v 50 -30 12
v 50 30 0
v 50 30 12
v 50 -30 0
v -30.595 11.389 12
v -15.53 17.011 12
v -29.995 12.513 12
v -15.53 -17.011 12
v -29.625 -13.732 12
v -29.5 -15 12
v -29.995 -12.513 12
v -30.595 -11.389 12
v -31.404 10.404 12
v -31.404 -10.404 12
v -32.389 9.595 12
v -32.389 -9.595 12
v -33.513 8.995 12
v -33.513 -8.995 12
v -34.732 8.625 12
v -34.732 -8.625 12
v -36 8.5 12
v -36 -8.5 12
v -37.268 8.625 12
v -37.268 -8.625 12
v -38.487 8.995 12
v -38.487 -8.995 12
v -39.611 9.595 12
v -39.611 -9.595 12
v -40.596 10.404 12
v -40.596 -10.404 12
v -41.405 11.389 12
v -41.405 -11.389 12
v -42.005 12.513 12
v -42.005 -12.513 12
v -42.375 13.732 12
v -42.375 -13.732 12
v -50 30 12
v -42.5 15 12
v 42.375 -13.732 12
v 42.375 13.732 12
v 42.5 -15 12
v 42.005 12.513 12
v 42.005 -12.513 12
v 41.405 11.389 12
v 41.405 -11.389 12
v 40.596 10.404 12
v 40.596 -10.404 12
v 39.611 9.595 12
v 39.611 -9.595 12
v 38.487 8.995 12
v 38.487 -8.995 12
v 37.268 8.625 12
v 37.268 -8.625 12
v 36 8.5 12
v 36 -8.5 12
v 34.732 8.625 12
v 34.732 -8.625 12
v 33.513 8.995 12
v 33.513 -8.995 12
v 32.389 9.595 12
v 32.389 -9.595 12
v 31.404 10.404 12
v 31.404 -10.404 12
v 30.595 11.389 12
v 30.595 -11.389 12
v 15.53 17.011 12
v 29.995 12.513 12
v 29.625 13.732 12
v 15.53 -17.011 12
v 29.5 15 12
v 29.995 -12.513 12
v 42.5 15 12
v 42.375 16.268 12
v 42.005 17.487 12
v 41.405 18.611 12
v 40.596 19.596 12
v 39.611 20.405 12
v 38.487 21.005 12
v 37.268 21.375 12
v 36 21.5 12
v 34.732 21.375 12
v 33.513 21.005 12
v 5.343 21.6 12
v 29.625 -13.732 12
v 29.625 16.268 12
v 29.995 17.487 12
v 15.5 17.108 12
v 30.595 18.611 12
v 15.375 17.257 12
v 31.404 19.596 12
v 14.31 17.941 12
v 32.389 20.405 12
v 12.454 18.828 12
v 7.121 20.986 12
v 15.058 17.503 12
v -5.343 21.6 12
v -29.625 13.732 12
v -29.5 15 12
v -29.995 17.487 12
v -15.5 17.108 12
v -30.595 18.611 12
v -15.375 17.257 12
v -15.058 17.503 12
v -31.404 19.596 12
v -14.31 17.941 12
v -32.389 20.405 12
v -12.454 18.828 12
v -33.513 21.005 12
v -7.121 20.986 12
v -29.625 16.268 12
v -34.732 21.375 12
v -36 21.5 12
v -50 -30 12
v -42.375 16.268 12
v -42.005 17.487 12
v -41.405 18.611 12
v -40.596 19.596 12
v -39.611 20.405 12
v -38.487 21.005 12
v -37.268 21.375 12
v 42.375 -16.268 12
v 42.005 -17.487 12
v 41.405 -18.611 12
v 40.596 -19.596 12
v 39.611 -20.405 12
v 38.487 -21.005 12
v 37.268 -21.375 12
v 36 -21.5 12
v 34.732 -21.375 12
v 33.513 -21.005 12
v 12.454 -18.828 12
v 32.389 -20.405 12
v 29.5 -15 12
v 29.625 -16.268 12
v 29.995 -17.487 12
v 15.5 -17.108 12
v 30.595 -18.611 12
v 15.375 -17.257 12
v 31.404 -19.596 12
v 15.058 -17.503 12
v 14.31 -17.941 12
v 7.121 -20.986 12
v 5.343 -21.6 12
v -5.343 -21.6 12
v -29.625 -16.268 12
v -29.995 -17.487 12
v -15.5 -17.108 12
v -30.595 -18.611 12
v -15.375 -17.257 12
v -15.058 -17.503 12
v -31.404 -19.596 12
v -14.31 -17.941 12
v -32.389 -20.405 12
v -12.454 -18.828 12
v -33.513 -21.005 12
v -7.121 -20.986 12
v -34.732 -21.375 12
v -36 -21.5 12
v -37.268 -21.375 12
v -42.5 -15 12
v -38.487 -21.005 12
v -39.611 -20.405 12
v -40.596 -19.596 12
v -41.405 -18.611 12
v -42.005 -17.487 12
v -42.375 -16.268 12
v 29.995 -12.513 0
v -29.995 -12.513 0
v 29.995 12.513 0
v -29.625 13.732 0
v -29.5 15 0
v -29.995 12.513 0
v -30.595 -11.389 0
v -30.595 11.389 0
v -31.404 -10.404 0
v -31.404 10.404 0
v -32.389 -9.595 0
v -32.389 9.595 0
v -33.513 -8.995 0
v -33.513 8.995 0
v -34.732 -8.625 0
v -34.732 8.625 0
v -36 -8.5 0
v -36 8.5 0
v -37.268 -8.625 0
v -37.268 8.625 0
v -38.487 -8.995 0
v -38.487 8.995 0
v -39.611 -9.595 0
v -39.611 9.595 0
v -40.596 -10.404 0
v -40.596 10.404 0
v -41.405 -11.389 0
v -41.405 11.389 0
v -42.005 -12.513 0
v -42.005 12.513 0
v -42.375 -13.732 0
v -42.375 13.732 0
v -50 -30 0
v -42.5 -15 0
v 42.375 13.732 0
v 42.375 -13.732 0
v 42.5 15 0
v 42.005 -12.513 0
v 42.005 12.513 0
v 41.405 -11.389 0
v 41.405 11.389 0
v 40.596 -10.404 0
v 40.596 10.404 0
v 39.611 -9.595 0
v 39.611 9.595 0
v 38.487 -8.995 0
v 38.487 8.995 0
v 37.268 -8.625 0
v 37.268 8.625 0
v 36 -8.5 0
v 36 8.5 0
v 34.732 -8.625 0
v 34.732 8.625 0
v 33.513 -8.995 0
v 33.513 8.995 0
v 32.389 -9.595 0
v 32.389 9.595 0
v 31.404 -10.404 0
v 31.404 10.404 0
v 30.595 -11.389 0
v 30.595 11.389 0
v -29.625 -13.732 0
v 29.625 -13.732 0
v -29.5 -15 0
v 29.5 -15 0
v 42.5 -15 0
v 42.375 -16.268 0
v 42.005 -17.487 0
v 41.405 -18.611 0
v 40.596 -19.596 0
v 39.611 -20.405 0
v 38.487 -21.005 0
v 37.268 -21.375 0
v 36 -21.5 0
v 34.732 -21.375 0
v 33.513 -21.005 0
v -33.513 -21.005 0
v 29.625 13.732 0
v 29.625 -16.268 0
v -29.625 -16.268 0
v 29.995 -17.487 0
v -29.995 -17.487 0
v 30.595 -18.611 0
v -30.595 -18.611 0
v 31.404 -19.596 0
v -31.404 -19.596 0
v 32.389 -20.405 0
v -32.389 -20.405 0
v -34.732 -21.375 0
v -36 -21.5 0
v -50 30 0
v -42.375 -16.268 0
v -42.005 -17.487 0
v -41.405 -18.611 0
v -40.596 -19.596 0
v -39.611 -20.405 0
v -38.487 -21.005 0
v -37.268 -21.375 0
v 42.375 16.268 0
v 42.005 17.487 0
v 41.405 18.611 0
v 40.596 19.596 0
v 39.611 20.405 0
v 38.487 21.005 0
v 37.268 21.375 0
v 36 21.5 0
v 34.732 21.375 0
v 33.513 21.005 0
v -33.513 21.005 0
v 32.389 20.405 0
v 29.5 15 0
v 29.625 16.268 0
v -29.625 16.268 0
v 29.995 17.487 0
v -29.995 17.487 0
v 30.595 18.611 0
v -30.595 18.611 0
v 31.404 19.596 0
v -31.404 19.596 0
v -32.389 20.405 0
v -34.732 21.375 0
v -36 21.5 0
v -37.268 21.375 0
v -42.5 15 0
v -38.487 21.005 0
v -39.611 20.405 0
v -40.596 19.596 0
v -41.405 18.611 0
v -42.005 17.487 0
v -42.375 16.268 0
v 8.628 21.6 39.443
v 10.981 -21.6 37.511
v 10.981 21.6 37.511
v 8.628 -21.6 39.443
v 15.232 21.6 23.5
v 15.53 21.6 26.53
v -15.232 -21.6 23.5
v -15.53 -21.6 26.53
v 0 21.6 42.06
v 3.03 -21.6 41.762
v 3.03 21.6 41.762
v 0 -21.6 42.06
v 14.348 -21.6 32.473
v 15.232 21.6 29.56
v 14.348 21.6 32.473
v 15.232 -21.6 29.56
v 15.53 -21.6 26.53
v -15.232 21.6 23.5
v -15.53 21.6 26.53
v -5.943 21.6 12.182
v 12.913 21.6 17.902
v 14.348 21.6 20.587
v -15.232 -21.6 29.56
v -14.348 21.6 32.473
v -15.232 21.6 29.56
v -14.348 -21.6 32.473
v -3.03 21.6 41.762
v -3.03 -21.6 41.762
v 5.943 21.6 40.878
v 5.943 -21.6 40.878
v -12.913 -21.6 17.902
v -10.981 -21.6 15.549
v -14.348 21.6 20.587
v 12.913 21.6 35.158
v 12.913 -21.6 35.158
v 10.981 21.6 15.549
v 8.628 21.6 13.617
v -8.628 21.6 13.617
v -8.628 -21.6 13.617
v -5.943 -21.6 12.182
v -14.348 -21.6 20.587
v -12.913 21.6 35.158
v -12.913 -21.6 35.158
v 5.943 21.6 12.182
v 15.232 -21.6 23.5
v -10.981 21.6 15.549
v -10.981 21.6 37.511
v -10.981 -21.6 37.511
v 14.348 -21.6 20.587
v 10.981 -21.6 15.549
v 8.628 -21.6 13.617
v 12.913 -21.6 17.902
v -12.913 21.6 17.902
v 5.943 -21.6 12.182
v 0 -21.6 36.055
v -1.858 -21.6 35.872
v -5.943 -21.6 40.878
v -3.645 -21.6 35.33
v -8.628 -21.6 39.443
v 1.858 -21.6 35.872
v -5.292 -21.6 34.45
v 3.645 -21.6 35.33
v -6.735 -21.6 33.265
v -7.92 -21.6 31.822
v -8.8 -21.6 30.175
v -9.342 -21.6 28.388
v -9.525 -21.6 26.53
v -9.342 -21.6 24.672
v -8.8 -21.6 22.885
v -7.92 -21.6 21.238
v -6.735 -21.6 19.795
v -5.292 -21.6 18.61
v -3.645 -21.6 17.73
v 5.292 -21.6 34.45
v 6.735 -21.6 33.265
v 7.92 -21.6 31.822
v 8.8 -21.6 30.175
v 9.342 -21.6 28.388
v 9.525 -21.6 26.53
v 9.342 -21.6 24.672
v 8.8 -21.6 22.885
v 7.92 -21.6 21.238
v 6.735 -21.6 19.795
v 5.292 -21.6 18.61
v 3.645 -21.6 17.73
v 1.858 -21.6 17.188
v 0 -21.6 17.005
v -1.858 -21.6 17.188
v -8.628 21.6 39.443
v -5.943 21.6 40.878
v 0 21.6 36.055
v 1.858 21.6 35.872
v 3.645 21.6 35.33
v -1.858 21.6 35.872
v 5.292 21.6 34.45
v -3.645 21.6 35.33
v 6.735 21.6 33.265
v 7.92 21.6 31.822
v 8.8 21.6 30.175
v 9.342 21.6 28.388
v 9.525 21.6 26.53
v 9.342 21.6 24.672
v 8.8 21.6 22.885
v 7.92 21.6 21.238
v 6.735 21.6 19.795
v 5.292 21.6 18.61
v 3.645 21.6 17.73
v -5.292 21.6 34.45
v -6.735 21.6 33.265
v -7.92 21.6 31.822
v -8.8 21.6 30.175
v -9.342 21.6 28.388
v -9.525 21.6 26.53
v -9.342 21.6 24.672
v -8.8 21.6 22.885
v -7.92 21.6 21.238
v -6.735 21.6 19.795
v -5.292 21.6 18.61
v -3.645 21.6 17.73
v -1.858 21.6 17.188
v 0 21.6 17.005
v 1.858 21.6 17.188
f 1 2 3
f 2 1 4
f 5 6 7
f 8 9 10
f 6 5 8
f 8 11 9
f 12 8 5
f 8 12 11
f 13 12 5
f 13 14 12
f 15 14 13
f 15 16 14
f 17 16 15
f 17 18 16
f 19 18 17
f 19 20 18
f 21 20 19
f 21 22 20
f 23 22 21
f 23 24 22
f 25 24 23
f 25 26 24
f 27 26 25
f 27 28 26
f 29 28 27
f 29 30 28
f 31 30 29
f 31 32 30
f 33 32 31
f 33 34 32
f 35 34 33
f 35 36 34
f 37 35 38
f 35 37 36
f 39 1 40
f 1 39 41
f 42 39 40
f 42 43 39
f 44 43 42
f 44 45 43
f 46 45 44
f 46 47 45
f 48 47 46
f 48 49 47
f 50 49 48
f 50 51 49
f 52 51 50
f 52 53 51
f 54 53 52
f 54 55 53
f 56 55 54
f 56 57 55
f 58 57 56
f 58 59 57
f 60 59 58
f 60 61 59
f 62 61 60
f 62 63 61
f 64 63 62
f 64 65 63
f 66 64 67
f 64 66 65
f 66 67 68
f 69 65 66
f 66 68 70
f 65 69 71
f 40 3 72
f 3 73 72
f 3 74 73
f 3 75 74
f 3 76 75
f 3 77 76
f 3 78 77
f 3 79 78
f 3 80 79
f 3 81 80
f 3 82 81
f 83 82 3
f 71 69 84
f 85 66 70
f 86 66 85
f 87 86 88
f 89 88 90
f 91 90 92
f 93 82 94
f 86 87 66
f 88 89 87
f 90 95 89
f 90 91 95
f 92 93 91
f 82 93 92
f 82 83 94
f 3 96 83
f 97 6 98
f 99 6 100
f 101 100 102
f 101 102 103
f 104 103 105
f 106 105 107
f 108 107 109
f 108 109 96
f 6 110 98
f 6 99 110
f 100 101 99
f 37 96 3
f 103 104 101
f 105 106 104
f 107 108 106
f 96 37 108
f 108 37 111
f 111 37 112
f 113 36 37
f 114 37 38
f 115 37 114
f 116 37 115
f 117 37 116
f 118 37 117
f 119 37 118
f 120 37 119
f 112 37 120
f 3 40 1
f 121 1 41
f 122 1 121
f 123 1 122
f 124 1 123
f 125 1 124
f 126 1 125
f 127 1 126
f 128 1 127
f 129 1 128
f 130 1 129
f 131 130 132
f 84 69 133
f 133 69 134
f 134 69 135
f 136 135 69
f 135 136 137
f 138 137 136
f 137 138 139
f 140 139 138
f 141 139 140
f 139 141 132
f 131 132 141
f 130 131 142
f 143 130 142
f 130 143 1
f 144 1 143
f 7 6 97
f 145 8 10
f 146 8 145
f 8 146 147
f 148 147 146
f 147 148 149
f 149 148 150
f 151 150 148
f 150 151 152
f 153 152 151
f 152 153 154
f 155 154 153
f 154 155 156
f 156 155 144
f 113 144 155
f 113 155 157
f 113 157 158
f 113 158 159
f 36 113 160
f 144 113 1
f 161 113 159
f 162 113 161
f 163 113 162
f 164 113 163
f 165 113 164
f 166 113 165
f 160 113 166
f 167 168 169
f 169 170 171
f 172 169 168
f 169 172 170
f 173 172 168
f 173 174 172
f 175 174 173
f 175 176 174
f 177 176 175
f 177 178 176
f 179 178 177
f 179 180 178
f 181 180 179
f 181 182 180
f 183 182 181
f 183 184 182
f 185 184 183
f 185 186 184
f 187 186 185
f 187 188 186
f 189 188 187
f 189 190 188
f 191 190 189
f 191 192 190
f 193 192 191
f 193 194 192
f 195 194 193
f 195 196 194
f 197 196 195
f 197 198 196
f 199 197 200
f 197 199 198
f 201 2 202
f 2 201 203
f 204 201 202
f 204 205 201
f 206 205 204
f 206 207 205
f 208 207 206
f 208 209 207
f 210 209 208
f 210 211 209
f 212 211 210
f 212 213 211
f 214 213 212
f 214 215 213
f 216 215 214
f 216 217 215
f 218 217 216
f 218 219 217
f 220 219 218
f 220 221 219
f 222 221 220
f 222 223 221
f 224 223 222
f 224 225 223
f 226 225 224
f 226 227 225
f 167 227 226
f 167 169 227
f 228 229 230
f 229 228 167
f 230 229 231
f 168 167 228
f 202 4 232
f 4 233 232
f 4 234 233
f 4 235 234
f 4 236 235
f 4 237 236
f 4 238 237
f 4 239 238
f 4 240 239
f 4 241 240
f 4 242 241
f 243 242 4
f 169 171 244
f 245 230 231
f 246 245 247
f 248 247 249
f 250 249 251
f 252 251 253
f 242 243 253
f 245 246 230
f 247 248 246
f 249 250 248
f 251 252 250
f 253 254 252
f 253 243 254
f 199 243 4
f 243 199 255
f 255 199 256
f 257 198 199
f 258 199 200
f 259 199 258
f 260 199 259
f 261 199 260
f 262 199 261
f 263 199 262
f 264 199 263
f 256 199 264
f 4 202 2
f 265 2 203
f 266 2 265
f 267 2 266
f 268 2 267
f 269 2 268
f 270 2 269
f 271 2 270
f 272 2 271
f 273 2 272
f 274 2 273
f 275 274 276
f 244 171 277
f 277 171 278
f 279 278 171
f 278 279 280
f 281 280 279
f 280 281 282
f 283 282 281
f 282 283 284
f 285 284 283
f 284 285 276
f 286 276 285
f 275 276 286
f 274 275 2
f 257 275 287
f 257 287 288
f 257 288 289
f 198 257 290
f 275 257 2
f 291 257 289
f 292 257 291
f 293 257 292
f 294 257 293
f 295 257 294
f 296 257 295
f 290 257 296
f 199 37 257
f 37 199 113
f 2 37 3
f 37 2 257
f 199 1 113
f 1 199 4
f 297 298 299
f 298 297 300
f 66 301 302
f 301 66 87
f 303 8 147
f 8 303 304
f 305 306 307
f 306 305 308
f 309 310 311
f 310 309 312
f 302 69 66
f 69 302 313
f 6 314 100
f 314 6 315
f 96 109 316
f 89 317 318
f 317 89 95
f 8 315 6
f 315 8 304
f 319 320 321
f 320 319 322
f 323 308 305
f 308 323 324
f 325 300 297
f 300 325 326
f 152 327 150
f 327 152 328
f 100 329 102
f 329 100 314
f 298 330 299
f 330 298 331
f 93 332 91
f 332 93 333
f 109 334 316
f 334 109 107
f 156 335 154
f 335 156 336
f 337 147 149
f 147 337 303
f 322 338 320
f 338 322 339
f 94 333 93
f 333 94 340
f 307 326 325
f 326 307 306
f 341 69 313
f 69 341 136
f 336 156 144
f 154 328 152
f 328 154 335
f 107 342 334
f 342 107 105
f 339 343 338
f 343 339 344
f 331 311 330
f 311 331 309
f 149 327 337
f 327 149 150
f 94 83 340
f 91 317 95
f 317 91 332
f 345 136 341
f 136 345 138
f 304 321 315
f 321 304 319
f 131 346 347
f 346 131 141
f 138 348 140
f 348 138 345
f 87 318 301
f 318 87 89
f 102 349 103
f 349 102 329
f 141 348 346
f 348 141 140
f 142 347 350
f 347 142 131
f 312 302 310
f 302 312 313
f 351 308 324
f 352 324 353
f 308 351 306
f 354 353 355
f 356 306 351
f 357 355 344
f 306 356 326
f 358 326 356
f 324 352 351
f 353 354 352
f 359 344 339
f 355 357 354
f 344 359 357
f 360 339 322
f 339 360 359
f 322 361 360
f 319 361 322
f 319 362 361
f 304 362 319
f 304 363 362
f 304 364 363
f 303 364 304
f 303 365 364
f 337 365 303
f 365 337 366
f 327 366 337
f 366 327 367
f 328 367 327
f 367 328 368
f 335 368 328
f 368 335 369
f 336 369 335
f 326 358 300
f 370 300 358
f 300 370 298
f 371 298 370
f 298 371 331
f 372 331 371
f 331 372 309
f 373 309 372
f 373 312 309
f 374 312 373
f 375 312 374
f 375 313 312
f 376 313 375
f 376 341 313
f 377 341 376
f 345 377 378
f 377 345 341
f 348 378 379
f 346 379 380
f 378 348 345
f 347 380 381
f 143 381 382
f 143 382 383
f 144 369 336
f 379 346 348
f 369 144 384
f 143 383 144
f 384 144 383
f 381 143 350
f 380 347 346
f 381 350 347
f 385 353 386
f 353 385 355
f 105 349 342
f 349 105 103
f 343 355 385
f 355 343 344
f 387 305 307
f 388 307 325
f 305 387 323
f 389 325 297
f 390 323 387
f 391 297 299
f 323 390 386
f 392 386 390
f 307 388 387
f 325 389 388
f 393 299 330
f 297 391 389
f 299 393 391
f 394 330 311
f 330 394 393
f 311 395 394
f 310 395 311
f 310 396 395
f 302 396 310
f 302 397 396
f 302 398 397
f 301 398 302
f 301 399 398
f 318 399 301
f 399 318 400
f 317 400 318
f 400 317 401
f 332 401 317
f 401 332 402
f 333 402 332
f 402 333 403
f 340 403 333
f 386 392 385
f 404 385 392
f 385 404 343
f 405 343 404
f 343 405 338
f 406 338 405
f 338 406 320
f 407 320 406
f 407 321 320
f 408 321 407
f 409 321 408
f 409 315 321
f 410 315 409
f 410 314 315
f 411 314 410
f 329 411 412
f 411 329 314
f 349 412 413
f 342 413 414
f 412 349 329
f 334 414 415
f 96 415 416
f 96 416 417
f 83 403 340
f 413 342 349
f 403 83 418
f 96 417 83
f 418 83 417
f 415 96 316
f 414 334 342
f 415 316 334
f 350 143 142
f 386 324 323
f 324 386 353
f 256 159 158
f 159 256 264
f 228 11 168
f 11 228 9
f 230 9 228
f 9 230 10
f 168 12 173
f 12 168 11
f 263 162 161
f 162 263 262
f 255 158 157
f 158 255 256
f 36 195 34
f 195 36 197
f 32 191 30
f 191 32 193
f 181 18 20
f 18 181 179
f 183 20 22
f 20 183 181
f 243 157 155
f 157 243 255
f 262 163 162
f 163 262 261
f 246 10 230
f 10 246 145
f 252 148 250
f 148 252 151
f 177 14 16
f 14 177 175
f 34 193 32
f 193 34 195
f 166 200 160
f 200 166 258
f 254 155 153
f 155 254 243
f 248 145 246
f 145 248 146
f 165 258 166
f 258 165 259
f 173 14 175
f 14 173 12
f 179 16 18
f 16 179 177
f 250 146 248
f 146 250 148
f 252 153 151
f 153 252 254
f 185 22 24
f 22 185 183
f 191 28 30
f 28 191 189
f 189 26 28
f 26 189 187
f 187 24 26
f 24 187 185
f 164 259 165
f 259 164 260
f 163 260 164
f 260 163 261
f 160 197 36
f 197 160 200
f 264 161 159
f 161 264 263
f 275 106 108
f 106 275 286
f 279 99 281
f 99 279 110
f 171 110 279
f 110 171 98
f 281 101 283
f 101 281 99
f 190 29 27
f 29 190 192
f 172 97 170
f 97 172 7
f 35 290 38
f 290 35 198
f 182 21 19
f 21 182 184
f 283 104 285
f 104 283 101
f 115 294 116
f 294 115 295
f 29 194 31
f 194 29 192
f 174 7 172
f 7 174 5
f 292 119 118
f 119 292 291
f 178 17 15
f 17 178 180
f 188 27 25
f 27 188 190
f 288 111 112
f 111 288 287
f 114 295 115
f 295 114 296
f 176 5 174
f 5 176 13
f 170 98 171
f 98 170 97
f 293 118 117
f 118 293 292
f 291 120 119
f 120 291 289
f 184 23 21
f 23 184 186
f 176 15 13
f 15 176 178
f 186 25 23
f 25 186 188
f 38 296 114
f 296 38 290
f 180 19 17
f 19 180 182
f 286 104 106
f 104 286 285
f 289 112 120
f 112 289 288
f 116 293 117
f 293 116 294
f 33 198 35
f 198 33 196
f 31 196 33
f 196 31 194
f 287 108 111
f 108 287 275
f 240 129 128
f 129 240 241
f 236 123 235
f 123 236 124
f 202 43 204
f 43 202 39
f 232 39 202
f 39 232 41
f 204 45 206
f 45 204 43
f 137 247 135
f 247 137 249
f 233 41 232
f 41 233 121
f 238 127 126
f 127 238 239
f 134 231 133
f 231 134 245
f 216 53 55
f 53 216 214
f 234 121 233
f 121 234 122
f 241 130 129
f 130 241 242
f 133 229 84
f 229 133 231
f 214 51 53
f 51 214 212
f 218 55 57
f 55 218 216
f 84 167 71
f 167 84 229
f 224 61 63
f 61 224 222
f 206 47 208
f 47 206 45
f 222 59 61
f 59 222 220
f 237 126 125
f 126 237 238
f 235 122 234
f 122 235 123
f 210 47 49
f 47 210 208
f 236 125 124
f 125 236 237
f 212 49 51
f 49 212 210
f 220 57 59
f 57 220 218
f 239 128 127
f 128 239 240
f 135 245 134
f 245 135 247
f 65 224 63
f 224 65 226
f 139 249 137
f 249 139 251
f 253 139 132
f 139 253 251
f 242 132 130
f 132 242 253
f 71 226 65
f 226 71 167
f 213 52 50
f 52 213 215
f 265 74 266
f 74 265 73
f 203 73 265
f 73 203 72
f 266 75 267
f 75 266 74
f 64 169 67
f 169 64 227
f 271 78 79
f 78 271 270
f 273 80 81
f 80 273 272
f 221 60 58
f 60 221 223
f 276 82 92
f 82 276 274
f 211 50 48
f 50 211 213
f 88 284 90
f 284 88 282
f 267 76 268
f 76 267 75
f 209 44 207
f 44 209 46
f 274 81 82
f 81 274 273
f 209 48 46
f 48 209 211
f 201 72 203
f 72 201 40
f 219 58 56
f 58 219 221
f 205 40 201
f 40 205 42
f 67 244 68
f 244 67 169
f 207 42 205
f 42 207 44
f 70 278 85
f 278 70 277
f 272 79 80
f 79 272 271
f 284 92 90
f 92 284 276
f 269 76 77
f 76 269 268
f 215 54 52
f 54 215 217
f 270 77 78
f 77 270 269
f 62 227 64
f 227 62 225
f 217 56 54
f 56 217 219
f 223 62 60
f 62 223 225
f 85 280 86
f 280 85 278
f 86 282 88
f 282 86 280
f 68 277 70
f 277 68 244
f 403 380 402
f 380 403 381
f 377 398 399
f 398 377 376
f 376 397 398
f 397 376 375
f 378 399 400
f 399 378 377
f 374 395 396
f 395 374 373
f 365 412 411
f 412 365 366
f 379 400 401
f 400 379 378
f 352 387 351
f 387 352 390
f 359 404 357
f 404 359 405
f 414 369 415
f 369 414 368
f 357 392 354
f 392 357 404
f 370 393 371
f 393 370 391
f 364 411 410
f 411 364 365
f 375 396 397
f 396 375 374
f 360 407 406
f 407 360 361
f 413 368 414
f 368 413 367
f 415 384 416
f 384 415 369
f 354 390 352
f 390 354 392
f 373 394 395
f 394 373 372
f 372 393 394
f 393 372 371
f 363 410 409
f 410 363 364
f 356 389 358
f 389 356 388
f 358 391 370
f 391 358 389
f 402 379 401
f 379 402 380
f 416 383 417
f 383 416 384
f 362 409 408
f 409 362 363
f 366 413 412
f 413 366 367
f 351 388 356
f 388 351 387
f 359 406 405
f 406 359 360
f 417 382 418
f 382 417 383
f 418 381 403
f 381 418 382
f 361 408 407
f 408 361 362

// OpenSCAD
$fn = 32;

// ----------------------------------------------------------------------
// Bearing block: 100 x 60 mm base, 19.05 mm bore at 26.53 mm
// ----------------------------------------------------------------------

// --- parameters (mm) ---
base_w = 100;             // base width
base_d = 60;              // base depth
base_t = 12;              // base thickness
bore_d = 19.05;           // shaft / bearing bore
house_r = 15.53;          // housing outer radius
house_len = 43.2;         // housing length along the shaft
foot_w = 31.06;           // foot width under the housing
foot_len = 33.2;          // foot length along the shaft
axis_z = 26.53;           // bore axis height above the base
holes_d = 13;             // mounting holes
hole_x = 36;              // mounting hole spacing

difference() {
  union() {
    /* base plate with its underside on z = 0 */
    translate([0, 0, base_t / 2]) cube([base_w, base_d, base_t], center = true);
    /* hull foot: a straight web blending into the round housing */
    hull() {
      translate([0, 0, base_t - 0.5]) cube([foot_w, foot_len, 1.6], center = true);
      translate([0, 0, axis_z]) rotate([-90, 0, 0]) cylinder(h = house_len, d = 2 * house_r, center = true);
    }
  }
  /* bore through the housing, 2.5 mm clear on both sides */
  translate([0, 0, axis_z]) rotate([-90, 0, 0]) cylinder(h = house_len + 5, d = bore_d, center = true);
  /* mounting holes through the base plate */
  for (hx = [-36, 36]) {
    for (hy = [-15, 15]) {
      translate([hx, hy, -2.5]) cylinder(h = base_t + 5, d = holes_d);
    }
  }
}
